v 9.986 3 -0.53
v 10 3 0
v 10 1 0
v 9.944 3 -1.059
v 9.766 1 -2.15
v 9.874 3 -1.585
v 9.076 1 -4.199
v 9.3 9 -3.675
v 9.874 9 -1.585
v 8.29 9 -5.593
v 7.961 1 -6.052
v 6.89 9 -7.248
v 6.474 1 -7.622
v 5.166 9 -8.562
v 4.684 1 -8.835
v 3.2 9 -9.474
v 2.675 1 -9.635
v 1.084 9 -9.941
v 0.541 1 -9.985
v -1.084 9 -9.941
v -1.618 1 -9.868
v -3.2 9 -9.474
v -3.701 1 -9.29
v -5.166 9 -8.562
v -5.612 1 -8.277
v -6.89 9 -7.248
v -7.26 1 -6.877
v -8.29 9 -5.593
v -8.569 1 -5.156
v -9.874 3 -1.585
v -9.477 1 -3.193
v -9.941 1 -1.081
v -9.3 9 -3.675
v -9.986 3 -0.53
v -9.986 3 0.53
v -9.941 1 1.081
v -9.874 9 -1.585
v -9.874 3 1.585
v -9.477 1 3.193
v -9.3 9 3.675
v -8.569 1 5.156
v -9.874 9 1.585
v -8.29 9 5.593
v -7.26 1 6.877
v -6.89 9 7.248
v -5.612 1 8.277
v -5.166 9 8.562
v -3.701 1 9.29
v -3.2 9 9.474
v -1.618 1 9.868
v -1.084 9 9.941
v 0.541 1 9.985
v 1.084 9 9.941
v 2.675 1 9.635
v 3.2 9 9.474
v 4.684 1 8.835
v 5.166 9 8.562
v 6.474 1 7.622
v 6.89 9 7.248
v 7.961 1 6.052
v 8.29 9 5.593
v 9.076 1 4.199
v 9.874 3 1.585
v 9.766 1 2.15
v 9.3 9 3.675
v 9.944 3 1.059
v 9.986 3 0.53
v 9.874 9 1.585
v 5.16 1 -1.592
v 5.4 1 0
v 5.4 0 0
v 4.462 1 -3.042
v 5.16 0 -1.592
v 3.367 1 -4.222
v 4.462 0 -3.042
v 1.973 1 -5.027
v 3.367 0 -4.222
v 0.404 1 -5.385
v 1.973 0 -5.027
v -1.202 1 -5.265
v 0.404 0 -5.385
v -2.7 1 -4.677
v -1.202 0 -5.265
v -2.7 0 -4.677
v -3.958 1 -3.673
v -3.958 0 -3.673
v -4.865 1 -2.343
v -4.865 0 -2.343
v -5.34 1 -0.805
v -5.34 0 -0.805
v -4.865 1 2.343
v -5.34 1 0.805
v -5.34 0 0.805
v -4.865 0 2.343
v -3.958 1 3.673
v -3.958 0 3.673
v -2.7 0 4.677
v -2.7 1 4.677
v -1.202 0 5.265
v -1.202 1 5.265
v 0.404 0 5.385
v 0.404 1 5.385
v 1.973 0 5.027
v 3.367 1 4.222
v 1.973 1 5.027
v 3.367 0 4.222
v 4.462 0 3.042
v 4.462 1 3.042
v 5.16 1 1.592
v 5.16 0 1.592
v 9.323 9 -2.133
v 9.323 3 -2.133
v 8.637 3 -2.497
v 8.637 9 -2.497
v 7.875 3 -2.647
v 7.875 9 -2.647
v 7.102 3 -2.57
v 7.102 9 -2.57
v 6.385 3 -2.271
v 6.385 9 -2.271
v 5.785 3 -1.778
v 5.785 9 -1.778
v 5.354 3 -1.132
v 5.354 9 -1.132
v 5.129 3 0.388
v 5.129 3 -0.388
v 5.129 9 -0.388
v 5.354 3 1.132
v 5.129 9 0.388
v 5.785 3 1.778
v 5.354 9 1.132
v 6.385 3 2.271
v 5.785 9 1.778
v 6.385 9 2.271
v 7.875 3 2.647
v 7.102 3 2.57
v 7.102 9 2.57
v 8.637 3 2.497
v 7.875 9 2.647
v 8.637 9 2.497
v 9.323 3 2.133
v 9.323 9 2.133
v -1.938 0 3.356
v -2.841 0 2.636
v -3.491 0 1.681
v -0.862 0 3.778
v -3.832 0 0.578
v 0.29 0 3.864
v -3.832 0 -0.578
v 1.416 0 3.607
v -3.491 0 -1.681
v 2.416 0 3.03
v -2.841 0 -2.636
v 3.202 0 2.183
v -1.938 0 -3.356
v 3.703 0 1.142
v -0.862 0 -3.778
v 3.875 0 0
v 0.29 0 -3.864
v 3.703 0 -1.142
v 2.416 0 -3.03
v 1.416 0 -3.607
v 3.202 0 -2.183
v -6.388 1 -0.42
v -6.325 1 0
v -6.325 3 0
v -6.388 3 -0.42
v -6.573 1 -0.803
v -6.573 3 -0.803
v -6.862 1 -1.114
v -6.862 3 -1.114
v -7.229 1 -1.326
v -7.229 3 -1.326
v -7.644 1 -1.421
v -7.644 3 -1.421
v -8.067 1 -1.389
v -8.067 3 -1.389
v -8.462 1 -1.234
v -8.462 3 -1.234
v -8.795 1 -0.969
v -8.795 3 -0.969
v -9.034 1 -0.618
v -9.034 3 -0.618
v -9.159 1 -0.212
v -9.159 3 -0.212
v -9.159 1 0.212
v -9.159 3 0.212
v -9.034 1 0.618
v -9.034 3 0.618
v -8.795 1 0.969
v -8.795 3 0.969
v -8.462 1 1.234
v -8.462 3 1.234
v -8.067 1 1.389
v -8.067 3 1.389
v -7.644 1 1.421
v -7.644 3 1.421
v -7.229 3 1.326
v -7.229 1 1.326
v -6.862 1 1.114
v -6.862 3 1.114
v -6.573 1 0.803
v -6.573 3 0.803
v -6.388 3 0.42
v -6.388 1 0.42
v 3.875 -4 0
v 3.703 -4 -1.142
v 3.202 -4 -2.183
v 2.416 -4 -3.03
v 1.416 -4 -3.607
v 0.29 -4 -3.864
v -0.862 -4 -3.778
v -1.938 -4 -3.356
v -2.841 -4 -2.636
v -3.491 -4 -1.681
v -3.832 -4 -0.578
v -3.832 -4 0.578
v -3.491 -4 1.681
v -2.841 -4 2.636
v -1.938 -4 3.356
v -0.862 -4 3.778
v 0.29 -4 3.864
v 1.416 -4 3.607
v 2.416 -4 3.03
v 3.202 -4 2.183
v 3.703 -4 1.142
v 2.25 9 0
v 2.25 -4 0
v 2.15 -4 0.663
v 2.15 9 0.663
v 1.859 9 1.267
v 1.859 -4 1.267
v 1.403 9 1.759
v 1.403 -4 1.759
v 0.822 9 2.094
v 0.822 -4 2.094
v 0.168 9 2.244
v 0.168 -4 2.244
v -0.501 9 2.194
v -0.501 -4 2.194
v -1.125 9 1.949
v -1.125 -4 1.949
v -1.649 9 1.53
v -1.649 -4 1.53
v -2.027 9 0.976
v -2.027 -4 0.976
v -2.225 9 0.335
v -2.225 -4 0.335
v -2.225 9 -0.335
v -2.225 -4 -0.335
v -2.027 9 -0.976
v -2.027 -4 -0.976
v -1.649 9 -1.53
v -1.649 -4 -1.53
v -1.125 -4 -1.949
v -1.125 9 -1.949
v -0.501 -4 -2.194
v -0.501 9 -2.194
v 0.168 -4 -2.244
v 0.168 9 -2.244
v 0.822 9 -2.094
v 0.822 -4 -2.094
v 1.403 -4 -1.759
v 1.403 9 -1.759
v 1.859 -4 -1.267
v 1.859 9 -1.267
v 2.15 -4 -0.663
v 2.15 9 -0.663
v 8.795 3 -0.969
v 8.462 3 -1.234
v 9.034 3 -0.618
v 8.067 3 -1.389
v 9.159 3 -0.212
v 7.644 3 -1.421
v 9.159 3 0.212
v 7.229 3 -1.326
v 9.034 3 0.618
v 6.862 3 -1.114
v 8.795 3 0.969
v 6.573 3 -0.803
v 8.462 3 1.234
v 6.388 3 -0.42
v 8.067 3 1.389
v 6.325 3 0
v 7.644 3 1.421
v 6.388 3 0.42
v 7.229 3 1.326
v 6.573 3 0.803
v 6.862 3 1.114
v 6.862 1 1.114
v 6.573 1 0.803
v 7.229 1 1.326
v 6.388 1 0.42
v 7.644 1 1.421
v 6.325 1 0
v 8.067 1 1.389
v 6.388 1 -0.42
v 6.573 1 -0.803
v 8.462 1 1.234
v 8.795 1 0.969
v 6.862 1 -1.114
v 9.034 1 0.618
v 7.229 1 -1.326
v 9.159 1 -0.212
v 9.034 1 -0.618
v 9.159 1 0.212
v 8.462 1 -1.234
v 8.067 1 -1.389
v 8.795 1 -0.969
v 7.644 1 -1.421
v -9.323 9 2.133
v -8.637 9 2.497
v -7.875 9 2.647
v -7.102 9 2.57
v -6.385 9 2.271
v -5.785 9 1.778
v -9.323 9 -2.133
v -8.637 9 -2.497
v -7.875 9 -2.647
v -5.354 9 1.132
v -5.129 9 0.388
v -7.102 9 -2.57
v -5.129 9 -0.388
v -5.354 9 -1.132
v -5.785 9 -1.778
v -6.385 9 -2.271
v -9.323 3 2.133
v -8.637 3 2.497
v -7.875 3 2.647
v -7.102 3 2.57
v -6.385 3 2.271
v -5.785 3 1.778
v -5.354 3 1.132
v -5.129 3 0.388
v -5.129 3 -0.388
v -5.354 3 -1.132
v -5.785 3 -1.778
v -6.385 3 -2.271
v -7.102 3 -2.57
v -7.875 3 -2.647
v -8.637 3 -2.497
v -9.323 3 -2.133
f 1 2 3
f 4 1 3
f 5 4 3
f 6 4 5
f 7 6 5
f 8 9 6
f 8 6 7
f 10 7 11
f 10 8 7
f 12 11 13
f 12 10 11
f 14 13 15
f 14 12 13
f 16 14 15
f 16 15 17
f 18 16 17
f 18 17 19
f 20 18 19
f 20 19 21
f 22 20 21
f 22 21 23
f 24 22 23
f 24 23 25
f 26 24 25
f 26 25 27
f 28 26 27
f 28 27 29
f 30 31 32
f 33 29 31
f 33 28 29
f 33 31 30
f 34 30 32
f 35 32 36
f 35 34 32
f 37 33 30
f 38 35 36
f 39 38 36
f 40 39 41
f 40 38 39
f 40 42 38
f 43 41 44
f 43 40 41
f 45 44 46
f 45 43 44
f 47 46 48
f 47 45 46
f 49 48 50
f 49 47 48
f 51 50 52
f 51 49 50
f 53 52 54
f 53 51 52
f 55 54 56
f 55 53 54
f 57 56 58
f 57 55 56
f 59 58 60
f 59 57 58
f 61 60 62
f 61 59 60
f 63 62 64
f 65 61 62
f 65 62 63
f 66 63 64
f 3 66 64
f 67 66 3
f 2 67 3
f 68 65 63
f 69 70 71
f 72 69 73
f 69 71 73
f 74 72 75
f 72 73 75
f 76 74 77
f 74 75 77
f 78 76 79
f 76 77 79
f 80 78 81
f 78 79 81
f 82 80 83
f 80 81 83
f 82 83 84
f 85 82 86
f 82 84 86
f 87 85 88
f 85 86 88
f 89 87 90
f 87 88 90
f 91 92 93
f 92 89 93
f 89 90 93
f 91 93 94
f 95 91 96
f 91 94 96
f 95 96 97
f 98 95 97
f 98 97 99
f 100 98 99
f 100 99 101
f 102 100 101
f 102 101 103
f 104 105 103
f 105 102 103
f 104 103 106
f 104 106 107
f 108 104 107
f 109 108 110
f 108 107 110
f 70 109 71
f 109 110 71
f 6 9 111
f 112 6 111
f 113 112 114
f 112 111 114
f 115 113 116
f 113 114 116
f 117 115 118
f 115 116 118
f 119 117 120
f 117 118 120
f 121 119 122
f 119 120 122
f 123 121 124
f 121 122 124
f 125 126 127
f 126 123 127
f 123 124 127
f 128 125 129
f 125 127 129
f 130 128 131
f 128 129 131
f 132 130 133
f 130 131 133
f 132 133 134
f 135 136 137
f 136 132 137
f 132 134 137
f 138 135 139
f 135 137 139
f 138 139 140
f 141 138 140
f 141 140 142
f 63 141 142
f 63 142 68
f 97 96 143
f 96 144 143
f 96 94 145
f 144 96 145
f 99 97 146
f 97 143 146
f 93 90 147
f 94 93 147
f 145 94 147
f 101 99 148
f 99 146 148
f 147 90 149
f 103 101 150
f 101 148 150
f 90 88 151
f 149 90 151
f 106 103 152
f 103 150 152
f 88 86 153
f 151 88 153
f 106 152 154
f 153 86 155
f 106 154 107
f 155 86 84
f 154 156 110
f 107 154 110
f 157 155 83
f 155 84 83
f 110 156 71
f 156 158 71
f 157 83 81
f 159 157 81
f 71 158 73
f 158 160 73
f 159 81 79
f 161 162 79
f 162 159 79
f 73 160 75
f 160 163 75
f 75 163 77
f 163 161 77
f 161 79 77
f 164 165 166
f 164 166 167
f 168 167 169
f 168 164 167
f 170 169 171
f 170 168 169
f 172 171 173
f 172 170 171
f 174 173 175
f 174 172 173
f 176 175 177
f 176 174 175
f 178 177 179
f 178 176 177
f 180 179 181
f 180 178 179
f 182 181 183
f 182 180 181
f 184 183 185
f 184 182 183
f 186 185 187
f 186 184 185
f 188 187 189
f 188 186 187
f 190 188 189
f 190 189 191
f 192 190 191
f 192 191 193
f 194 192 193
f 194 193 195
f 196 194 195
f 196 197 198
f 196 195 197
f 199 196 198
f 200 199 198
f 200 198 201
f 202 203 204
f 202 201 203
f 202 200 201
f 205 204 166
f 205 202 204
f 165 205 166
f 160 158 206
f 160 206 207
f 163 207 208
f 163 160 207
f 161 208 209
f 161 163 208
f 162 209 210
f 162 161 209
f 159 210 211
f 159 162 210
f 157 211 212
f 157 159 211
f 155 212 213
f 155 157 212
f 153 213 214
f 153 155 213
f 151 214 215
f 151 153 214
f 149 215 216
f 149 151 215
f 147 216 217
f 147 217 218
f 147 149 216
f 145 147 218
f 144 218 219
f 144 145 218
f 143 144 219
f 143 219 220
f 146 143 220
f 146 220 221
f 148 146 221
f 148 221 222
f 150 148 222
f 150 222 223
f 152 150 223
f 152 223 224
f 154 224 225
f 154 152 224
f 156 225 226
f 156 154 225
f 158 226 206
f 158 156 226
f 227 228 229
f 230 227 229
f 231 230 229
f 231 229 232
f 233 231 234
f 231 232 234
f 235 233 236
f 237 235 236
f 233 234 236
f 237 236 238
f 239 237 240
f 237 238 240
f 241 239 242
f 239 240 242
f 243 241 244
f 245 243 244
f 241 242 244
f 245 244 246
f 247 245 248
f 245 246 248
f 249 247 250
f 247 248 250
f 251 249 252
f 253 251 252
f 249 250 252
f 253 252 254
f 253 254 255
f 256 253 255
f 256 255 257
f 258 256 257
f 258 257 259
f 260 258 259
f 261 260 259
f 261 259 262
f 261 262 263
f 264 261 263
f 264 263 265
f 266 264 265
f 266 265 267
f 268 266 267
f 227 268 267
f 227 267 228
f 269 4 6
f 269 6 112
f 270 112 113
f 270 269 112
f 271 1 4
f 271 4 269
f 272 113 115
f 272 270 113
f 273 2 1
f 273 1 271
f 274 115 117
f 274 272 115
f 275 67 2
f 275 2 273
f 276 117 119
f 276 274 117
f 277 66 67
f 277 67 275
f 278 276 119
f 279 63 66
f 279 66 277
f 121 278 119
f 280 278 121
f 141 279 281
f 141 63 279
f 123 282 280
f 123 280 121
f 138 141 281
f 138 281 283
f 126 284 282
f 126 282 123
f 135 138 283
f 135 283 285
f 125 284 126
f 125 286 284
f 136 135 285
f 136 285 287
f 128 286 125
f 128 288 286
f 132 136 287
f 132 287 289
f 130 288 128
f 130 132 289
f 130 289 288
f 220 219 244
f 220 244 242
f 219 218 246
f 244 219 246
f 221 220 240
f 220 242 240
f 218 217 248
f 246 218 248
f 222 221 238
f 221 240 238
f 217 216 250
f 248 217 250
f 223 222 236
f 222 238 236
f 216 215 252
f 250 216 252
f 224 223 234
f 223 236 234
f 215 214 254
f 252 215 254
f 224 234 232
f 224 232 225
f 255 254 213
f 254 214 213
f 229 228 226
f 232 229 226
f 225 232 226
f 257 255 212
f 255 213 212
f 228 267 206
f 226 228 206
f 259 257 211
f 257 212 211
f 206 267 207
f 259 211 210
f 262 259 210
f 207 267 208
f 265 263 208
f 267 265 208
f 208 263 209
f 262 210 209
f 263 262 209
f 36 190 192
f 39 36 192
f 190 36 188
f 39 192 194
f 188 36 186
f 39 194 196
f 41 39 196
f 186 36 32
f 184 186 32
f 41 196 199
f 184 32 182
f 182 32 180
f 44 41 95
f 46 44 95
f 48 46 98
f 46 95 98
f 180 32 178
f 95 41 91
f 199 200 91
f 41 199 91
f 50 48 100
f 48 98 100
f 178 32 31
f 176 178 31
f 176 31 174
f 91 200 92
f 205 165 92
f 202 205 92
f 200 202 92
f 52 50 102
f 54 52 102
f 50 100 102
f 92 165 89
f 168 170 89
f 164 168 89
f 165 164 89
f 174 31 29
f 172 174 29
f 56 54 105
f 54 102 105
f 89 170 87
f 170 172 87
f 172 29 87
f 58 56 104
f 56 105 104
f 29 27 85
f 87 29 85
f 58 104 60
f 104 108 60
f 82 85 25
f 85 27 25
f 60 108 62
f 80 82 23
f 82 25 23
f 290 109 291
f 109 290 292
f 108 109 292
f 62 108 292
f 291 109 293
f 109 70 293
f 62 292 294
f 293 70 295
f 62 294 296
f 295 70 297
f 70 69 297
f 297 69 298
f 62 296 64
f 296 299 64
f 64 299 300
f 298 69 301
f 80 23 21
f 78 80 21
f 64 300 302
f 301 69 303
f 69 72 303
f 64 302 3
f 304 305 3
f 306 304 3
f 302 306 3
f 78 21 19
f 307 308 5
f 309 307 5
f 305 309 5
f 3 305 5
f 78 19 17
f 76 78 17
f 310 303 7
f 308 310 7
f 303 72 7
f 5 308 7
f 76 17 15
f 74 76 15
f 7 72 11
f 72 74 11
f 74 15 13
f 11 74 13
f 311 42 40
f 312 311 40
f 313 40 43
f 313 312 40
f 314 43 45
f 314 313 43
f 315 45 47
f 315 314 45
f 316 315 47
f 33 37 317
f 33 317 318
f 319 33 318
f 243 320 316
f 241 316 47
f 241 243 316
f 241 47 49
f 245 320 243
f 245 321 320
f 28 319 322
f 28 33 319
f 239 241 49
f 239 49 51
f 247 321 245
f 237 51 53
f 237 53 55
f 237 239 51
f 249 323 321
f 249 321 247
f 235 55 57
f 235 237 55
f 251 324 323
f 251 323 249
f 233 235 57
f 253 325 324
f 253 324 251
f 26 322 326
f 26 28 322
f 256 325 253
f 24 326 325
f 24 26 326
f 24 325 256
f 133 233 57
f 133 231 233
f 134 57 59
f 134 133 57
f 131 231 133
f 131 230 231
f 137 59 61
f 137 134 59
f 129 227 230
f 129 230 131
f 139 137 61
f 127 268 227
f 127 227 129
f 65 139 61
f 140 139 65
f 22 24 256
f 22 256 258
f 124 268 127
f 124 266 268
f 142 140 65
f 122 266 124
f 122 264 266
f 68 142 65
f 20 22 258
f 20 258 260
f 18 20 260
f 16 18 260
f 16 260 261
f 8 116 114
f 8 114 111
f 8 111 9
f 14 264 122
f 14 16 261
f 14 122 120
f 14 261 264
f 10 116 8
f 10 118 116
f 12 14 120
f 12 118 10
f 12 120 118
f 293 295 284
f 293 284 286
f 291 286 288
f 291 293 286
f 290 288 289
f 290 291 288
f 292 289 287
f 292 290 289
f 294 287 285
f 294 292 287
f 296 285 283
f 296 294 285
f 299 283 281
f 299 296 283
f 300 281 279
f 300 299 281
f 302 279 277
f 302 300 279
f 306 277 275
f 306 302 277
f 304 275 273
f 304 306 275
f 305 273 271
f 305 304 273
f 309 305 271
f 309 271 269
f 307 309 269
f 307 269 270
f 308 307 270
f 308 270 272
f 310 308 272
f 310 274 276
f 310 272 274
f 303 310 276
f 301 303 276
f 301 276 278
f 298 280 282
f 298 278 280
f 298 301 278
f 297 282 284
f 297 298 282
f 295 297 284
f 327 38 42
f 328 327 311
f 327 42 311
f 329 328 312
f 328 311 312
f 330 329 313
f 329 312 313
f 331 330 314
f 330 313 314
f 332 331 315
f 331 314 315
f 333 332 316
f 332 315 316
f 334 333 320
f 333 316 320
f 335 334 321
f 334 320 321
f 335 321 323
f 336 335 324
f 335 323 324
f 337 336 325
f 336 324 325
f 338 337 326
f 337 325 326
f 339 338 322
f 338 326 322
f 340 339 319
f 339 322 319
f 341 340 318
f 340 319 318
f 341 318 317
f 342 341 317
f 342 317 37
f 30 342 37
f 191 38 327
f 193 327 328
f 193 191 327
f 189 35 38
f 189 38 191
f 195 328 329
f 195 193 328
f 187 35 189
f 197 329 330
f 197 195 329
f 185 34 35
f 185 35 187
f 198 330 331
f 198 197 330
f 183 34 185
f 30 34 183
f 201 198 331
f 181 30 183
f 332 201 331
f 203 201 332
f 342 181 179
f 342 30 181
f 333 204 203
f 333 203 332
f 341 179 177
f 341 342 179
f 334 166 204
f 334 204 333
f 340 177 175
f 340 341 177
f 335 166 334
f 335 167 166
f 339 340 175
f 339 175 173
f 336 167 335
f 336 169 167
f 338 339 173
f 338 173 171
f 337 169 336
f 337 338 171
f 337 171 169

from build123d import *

# Parameters (mm, degrees)
SKETCH1_R                = 3.875
BOSS_EXTRUDE1_DEPTH      = 9
BOSS_EXTRUDE1_DEPTH_BACK = 4
SKETCH2_R                = 5.4
BOSS_EXTRUDE2_DEPTH      = 9
SKETCH7_R                = 10
BOSS_EXTRUDE4_DEPTH      = 8
CUT_EXTRUDE2_START       = -9
SKETCH3_R                = 1.425
CUT_EXTRUDE2_DEPTH       = 10
SKETCH6_R                = 2.65
CUT_EXTRUDE3_DEPTH       = 6
CIRPATTERN1_COUNT        = 2
SKETCH8_R                = 2.25
CUT_EXTRUDE4_DEPTH       = 1
CUT_EXTRUDE4_DEPTH_BACK  = 14


with BuildPart() as part:
    # Sketch1 → Boss-Extrude1 (new body, two sides)
    with BuildSketch(Plane(origin=(0, 0, 0), x_dir=(1, 0, 0), z_dir=(0, 1, 0))) as boss_extrude1_sk:
        Circle(SKETCH1_R)
    extrude(amount=BOSS_EXTRUDE1_DEPTH)
    extrude(boss_extrude1_sk.sketch, amount=-BOSS_EXTRUDE1_DEPTH_BACK)

    # Sketch2 → Boss-Extrude2 (add)
    with BuildSketch(Plane(origin=(0, 0, 0), x_dir=(1, 0, 0), z_dir=(0, 1, 0))):
        Circle(SKETCH2_R)
    extrude(amount=BOSS_EXTRUDE2_DEPTH)

    # Sketch7 → Boss-Extrude4 (add)
    with BuildSketch(Plane(origin=(0, 9, 0), x_dir=(1, 0, 0), z_dir=(0, 1, 0))):
        Circle(SKETCH7_R)
    extrude(amount=-BOSS_EXTRUDE4_DEPTH)

    # Sketch3 → Cut-Extrude2 (cut)
    with BuildSketch(Plane(origin=(0, 9, 0), x_dir=(1, 0, 0), z_dir=(0, 1, 0)).offset(CUT_EXTRUDE2_START)):
        with Locations((-7.75, 0)):
            Circle(SKETCH3_R)
    cut_extrude2 = extrude(amount=CUT_EXTRUDE2_DEPTH, mode=Mode.SUBTRACT)

    # Sketch6 → Cut-Extrude3 (cut)
    with BuildSketch(Plane(origin=(0, 9, 0), x_dir=(1, 0, 0), z_dir=(0, 1, 0))):
        with Locations((-7.75, 0)):
            Circle(SKETCH6_R)
    cut_extrude3 = extrude(amount=-CUT_EXTRUDE3_DEPTH, mode=Mode.SUBTRACT)

    # CirPattern1: Cut-Extrude2, Cut-Extrude3 ×2 about axis
    cirpattern1_axis = Axis((0, 0, 0), (0, 1, 0))
    for i in range(1, CIRPATTERN1_COUNT):
        add(cut_extrude2.rotate(cirpattern1_axis, i * 360 / CIRPATTERN1_COUNT), mode=Mode.SUBTRACT)
        add(cut_extrude3.rotate(cirpattern1_axis, i * 360 / CIRPATTERN1_COUNT), mode=Mode.SUBTRACT)

    # Sketch8 → Cut-Extrude4 (cut, two sides)
    with BuildSketch(Plane.XZ.offset(4)) as cut_extrude4_sk:
        Circle(SKETCH8_R)
    extrude(amount=CUT_EXTRUDE4_DEPTH, mode=Mode.SUBTRACT)
    extrude(cut_extrude4_sk.sketch, amount=-CUT_EXTRUDE4_DEPTH_BACK, mode=Mode.SUBTRACT)


solid = part.part
